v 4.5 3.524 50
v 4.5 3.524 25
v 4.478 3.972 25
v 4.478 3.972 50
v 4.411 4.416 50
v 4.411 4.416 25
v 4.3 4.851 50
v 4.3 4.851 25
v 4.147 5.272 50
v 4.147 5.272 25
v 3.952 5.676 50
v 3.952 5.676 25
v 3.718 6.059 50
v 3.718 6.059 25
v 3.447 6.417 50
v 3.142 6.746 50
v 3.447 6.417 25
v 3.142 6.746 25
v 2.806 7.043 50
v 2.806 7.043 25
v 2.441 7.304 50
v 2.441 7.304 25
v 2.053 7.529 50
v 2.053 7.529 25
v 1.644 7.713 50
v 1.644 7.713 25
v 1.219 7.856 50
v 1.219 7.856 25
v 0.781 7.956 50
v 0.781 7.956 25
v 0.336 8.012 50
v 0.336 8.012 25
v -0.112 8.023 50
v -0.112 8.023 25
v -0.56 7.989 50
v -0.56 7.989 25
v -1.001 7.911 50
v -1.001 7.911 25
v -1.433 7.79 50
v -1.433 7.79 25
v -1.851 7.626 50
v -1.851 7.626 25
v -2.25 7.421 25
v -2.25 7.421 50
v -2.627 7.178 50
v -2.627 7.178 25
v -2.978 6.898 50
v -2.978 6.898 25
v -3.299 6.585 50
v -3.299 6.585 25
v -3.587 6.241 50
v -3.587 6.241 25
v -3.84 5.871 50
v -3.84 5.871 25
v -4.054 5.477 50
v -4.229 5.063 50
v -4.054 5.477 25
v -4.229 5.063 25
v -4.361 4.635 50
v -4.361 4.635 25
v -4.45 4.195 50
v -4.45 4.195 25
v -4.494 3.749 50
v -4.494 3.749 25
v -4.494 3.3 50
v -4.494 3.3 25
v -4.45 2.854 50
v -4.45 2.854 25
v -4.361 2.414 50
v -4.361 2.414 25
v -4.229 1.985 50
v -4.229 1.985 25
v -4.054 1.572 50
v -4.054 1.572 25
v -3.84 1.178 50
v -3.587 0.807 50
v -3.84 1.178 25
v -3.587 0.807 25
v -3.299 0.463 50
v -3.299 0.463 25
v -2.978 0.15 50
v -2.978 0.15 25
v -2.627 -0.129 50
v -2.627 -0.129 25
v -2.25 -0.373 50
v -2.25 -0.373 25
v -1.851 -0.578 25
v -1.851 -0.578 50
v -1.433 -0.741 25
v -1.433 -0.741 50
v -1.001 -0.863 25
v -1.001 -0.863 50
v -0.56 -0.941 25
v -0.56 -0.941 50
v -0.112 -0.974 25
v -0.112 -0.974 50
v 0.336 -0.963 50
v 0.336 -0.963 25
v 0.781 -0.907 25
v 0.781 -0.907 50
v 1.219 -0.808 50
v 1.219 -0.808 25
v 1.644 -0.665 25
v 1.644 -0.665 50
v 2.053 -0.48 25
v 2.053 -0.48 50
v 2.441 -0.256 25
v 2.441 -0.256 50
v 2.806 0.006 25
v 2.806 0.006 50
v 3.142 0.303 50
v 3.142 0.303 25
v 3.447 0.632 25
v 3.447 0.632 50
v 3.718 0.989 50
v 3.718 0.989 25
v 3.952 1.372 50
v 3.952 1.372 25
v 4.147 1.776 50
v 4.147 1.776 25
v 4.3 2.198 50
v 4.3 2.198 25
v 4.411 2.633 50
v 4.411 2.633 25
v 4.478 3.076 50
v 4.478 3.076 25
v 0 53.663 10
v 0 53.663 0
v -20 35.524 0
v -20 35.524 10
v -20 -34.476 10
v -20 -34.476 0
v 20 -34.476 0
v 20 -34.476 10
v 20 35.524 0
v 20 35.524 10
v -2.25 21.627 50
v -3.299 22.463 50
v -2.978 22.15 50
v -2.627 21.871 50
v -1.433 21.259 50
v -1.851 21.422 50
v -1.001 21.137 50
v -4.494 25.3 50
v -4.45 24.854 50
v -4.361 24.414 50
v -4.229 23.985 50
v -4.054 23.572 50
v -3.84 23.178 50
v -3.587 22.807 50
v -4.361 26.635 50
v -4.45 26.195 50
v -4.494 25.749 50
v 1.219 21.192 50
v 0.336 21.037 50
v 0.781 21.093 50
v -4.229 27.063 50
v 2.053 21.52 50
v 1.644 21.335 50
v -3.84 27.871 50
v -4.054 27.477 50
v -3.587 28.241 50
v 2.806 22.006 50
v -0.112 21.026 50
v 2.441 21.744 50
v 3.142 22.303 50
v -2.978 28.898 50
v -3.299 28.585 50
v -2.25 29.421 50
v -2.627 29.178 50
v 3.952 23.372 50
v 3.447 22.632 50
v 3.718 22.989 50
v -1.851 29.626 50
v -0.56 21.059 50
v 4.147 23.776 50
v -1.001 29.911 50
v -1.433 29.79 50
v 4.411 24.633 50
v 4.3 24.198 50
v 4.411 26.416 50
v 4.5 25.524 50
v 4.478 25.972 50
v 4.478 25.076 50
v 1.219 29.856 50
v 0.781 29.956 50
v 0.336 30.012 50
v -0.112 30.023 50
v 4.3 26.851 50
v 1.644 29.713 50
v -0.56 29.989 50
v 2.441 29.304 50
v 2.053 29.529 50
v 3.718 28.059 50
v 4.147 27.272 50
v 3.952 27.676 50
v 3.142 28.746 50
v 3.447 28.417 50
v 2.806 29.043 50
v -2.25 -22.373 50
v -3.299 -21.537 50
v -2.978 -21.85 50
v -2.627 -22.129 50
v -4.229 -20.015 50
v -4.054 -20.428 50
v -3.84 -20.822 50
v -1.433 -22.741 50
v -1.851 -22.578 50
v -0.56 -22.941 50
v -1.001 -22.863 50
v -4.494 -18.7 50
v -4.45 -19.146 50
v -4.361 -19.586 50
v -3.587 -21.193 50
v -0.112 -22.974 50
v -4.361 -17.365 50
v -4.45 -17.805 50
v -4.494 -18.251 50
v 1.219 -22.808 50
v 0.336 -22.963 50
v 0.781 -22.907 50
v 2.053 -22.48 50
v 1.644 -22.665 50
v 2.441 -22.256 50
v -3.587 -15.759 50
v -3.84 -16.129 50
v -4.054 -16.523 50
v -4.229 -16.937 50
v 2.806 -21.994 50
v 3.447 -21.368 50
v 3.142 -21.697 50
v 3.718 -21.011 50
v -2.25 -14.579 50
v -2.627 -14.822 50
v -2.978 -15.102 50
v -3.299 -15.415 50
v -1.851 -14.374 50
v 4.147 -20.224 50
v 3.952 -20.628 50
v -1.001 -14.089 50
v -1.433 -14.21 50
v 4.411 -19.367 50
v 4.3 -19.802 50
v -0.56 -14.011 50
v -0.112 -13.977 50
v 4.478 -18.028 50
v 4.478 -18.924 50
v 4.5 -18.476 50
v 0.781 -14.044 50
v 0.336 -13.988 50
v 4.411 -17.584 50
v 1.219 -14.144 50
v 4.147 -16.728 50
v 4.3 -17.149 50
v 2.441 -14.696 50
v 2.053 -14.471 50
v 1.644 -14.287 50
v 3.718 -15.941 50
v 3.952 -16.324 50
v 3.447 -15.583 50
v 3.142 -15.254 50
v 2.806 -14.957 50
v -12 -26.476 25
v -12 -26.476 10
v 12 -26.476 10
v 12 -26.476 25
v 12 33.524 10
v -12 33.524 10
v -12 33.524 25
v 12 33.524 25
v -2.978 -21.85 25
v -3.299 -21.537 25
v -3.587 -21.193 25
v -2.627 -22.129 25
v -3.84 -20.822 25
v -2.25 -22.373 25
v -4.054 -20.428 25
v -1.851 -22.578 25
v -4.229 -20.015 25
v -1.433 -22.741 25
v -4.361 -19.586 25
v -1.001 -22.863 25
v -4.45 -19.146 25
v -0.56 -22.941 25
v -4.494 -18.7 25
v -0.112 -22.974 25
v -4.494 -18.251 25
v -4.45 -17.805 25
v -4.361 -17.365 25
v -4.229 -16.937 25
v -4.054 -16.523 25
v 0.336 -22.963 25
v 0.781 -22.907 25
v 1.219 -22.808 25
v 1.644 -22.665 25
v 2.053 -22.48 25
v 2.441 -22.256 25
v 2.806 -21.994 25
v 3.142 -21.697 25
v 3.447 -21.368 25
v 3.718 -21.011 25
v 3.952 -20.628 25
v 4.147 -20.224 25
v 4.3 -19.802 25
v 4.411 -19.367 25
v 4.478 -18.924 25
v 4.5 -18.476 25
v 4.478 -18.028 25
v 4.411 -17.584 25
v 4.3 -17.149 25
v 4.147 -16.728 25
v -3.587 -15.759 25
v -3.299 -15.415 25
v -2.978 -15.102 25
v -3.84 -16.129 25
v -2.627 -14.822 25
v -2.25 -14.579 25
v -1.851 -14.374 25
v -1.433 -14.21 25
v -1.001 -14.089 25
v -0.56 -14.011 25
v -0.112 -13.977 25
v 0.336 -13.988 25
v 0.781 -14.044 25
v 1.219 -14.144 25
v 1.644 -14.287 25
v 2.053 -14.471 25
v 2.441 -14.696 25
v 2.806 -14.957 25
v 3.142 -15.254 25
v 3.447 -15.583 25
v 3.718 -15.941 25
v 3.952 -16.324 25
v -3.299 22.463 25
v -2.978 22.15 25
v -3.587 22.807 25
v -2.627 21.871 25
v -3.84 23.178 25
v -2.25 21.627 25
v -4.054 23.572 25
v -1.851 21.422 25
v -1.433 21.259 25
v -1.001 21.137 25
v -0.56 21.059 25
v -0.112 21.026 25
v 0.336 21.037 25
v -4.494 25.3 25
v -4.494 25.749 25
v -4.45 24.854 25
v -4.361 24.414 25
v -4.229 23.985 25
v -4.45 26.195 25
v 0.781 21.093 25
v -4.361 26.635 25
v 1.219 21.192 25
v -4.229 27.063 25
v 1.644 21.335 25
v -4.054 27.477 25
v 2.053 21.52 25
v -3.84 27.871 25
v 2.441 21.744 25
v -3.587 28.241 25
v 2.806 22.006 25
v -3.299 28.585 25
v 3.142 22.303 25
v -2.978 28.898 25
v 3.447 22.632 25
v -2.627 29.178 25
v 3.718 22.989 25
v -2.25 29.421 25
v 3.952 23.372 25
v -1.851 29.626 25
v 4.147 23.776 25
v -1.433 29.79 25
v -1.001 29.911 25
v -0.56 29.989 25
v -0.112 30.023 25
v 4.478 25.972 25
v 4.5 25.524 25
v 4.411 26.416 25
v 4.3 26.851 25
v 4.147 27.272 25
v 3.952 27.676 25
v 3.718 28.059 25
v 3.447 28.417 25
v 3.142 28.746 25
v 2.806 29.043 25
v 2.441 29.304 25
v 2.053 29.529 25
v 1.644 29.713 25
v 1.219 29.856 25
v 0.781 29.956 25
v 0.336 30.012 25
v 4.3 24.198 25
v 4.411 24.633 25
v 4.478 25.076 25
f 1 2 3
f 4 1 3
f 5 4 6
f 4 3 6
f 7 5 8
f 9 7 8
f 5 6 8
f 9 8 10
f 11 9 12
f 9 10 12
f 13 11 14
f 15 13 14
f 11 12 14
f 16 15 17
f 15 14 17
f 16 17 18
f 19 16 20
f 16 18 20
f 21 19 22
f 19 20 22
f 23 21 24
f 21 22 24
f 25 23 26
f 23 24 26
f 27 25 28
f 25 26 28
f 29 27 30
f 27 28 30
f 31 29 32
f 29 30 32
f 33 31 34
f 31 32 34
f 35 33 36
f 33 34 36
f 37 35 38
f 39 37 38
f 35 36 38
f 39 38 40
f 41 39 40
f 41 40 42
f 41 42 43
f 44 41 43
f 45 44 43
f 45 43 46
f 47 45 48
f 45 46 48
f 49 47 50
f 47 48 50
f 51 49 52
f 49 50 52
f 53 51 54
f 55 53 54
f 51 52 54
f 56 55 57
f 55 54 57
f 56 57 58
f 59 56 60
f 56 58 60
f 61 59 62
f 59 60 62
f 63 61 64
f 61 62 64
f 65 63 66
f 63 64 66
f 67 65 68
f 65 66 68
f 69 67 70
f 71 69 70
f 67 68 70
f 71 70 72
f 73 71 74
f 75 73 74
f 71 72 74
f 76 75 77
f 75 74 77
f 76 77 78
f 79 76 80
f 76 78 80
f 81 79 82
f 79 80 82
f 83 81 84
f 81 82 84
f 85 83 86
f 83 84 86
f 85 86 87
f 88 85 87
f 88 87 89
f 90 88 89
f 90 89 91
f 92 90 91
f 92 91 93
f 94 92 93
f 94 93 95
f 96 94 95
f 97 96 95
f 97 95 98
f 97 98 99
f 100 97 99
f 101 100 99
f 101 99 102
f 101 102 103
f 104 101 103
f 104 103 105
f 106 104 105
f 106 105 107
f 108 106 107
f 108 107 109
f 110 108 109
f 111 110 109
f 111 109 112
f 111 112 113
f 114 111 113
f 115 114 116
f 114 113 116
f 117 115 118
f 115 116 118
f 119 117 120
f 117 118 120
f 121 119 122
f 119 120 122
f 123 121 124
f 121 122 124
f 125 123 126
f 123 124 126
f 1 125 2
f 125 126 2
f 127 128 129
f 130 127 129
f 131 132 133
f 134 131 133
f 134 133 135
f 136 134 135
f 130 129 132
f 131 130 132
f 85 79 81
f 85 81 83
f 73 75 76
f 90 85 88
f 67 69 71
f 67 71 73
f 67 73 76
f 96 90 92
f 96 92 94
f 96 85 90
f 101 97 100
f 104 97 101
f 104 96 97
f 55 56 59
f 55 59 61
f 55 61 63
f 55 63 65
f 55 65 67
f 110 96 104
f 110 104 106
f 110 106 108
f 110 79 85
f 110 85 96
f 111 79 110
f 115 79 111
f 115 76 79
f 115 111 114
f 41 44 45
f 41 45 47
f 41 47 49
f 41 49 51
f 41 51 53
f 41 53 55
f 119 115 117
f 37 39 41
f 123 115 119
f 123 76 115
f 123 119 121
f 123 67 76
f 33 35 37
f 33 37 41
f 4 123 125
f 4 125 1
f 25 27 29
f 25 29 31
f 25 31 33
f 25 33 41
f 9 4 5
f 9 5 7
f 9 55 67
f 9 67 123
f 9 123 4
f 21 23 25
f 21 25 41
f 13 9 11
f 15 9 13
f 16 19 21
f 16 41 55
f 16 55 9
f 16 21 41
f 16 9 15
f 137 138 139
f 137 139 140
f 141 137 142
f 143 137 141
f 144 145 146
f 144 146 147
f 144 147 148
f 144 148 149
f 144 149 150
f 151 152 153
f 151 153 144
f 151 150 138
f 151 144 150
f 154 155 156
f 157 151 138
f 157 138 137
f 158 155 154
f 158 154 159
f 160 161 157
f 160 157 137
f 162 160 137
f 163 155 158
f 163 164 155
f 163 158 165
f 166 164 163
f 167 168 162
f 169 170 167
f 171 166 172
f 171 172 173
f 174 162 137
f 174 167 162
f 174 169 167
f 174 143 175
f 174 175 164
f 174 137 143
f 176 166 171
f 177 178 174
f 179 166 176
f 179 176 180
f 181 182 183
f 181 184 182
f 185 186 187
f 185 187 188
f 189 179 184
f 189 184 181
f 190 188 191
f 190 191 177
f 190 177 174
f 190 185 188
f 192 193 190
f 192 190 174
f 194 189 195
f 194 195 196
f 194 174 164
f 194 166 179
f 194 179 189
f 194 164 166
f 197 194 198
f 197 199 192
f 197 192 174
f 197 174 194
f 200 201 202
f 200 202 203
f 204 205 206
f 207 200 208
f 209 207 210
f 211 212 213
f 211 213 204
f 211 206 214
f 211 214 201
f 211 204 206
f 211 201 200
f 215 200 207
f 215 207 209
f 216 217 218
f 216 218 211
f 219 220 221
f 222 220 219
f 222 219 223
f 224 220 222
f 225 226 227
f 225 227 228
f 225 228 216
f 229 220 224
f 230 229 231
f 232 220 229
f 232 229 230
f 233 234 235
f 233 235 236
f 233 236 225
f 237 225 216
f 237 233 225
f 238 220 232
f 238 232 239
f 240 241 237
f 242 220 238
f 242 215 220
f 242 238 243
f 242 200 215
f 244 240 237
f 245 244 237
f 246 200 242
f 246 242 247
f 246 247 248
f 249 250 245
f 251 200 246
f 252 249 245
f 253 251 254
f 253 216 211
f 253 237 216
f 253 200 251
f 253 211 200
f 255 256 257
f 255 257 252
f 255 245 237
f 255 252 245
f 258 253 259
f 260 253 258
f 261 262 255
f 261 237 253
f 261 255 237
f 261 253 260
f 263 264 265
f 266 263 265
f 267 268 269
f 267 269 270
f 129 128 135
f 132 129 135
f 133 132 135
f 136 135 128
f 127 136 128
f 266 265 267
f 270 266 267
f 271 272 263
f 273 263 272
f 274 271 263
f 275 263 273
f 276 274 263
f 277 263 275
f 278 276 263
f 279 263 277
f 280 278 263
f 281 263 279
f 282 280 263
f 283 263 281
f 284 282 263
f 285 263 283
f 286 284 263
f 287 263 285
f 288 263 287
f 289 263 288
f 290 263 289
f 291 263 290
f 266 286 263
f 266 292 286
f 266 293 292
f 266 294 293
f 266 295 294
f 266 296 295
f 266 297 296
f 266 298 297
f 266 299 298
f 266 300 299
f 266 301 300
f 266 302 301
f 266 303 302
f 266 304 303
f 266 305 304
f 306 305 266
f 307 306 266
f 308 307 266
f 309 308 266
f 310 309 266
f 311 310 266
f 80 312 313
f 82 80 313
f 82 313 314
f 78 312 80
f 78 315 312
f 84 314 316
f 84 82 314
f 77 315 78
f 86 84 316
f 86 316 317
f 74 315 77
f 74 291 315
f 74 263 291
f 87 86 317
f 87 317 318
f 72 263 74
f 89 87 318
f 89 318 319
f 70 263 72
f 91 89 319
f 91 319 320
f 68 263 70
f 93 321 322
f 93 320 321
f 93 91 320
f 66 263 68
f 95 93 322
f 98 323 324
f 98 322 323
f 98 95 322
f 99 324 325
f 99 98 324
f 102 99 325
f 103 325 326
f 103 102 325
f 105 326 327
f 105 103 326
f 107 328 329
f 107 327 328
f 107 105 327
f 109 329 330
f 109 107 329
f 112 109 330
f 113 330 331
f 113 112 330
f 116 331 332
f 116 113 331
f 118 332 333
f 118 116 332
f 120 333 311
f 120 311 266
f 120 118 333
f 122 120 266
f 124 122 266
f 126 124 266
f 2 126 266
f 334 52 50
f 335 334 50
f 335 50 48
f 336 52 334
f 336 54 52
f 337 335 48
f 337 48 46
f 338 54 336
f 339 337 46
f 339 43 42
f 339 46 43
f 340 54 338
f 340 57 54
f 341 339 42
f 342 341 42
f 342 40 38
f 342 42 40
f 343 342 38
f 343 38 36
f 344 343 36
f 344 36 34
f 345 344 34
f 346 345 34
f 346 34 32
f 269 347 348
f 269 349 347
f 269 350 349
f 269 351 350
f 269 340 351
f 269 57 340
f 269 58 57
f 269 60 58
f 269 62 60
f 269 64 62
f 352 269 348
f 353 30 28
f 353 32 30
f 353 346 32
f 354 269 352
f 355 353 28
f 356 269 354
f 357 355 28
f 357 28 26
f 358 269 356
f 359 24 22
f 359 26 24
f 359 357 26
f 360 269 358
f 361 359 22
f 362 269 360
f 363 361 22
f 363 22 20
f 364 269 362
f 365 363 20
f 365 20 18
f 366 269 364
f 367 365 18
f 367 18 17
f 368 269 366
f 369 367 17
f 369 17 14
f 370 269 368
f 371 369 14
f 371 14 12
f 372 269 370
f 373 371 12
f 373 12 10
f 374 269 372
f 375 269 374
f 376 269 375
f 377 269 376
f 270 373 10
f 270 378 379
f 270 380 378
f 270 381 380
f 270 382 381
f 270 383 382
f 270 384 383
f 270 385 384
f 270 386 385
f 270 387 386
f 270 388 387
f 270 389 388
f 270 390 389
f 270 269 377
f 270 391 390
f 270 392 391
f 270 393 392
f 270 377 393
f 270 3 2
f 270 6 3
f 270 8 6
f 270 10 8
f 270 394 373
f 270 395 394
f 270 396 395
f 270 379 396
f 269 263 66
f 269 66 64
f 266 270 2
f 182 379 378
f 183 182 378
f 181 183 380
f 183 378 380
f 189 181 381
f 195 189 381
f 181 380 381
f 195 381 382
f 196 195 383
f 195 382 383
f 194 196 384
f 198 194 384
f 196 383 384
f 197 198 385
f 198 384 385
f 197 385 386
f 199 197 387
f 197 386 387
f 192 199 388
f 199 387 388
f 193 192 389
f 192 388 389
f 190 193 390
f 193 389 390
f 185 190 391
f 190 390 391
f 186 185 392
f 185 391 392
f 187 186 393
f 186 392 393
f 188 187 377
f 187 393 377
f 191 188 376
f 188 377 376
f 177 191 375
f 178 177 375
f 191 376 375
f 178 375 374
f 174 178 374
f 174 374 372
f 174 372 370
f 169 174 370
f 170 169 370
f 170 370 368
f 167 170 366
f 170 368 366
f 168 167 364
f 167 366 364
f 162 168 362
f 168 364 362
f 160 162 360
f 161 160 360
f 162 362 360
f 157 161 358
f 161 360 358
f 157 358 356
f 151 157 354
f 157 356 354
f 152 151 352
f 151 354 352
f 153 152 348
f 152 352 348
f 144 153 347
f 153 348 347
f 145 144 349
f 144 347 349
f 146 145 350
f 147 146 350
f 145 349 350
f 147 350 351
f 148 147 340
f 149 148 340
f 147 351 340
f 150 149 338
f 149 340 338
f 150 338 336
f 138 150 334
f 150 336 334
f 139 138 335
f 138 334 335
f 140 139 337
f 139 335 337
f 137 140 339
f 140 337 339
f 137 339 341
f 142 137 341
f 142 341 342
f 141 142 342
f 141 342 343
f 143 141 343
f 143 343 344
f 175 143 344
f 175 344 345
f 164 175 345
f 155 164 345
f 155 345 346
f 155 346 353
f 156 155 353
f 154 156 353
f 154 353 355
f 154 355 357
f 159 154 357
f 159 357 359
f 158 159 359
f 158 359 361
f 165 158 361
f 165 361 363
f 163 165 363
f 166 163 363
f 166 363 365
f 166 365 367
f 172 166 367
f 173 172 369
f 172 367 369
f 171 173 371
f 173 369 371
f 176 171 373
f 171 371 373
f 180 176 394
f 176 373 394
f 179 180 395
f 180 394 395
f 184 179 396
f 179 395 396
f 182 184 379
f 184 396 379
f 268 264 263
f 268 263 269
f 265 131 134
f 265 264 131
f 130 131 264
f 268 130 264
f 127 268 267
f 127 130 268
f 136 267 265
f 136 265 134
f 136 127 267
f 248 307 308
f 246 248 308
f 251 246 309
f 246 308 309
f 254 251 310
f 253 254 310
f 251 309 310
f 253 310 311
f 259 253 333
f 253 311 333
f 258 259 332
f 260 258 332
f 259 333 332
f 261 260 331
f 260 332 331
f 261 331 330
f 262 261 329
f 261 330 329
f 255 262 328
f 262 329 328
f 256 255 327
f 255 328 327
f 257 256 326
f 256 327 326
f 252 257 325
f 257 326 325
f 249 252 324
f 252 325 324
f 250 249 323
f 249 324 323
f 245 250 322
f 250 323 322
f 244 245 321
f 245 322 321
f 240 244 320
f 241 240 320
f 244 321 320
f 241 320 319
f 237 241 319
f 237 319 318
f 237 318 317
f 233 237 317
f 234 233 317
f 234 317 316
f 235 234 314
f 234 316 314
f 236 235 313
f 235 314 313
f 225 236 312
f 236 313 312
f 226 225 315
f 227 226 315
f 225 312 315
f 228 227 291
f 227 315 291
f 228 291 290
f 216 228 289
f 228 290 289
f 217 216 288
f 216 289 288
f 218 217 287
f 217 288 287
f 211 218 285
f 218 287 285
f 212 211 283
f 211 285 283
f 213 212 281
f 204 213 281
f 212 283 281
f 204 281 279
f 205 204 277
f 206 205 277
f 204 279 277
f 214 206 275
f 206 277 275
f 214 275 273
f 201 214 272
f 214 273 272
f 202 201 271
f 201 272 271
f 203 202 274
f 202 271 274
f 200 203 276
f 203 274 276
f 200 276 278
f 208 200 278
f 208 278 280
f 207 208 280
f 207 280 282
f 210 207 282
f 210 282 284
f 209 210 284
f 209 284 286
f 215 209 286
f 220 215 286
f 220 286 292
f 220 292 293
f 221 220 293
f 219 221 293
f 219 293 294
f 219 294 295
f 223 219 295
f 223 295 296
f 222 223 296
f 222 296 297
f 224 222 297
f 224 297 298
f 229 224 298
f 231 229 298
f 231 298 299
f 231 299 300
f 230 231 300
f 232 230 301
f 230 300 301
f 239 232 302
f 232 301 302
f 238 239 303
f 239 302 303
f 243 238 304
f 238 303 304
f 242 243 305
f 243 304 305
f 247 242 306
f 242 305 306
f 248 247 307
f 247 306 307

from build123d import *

# Parameters (mm, degrees)
F1_DEPTH = 10
F2_W     = 24
F2_H     = 60
F3_DEPTH = 25
F4_R     = 4.5
F5_DEPTH = 25


with BuildPart() as f1:
    # F0 (on Top) → F1 (new body)
    with BuildSketch(Plane.XY):
        Polygon((0, 53.662619), (-20, 35.524262), (-20, -34.475738), (20, -34.475738), (20, 35.524262), align=None)
    extrude(amount=F1_DEPTH)

    # F2 (on Top) → F3 (join)
    with BuildSketch(Plane.XY):
        with Locations((0, 3.524262)):
            Rectangle(F2_W, F2_H)
    extrude(amount=F3_DEPTH)

    # F4 (on face) → F5 (join)
    with BuildSketch(Plane.XY.offset(25)):
        with Locations((0, 25.524262)):
            Circle(F4_R)
        with Locations((0, 3.524262)):
            Circle(F4_R)
        with Locations((0, -18.475738)):
            Circle(F4_R)
    extrude(amount=F5_DEPTH)


solid = f1.part
